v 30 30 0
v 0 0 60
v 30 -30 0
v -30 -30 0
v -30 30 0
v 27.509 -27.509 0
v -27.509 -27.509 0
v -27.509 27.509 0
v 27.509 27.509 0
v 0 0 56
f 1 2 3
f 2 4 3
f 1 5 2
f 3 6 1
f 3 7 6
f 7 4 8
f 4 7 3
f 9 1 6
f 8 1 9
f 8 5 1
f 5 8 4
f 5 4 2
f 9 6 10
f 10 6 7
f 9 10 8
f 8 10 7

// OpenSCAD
// Dr.Gerg's Battery Box
// OpenSCAD definition file
// https://www.drgerg.com
// OpenSCAD Cheatsheet http://www.openscad.org/cheatsheet/index.html
//
// PARAMETER DEFINITIONS// PARAMETER DEFINITIONS
// 
// 60x60x60


topPoints = [
    [30,30,0],      //0
    [30,-30,0],     //1
    [-30,-30,0],    //2
    [-30,30,0],     //3
    [0,0,60]];       //4  TDC

lowPoints = [
    [28,28,-1],      //0
    [28,-28,-1],     //1
    [-28,-28,-1],    //2
    [-28,28,-1],     //3
    [0,0,56]];       //4  TDC

topFaces = [
    [0,1,4],
    [1,2,4],
    [2,3,4],
    [3,0,4],
    [2,1,0],[0,3,2]];


module cap(){
    difference(){
    polyhedron(topPoints,topFaces);
    polyhedron(lowPoints,topFaces);
    }
}

cap();
